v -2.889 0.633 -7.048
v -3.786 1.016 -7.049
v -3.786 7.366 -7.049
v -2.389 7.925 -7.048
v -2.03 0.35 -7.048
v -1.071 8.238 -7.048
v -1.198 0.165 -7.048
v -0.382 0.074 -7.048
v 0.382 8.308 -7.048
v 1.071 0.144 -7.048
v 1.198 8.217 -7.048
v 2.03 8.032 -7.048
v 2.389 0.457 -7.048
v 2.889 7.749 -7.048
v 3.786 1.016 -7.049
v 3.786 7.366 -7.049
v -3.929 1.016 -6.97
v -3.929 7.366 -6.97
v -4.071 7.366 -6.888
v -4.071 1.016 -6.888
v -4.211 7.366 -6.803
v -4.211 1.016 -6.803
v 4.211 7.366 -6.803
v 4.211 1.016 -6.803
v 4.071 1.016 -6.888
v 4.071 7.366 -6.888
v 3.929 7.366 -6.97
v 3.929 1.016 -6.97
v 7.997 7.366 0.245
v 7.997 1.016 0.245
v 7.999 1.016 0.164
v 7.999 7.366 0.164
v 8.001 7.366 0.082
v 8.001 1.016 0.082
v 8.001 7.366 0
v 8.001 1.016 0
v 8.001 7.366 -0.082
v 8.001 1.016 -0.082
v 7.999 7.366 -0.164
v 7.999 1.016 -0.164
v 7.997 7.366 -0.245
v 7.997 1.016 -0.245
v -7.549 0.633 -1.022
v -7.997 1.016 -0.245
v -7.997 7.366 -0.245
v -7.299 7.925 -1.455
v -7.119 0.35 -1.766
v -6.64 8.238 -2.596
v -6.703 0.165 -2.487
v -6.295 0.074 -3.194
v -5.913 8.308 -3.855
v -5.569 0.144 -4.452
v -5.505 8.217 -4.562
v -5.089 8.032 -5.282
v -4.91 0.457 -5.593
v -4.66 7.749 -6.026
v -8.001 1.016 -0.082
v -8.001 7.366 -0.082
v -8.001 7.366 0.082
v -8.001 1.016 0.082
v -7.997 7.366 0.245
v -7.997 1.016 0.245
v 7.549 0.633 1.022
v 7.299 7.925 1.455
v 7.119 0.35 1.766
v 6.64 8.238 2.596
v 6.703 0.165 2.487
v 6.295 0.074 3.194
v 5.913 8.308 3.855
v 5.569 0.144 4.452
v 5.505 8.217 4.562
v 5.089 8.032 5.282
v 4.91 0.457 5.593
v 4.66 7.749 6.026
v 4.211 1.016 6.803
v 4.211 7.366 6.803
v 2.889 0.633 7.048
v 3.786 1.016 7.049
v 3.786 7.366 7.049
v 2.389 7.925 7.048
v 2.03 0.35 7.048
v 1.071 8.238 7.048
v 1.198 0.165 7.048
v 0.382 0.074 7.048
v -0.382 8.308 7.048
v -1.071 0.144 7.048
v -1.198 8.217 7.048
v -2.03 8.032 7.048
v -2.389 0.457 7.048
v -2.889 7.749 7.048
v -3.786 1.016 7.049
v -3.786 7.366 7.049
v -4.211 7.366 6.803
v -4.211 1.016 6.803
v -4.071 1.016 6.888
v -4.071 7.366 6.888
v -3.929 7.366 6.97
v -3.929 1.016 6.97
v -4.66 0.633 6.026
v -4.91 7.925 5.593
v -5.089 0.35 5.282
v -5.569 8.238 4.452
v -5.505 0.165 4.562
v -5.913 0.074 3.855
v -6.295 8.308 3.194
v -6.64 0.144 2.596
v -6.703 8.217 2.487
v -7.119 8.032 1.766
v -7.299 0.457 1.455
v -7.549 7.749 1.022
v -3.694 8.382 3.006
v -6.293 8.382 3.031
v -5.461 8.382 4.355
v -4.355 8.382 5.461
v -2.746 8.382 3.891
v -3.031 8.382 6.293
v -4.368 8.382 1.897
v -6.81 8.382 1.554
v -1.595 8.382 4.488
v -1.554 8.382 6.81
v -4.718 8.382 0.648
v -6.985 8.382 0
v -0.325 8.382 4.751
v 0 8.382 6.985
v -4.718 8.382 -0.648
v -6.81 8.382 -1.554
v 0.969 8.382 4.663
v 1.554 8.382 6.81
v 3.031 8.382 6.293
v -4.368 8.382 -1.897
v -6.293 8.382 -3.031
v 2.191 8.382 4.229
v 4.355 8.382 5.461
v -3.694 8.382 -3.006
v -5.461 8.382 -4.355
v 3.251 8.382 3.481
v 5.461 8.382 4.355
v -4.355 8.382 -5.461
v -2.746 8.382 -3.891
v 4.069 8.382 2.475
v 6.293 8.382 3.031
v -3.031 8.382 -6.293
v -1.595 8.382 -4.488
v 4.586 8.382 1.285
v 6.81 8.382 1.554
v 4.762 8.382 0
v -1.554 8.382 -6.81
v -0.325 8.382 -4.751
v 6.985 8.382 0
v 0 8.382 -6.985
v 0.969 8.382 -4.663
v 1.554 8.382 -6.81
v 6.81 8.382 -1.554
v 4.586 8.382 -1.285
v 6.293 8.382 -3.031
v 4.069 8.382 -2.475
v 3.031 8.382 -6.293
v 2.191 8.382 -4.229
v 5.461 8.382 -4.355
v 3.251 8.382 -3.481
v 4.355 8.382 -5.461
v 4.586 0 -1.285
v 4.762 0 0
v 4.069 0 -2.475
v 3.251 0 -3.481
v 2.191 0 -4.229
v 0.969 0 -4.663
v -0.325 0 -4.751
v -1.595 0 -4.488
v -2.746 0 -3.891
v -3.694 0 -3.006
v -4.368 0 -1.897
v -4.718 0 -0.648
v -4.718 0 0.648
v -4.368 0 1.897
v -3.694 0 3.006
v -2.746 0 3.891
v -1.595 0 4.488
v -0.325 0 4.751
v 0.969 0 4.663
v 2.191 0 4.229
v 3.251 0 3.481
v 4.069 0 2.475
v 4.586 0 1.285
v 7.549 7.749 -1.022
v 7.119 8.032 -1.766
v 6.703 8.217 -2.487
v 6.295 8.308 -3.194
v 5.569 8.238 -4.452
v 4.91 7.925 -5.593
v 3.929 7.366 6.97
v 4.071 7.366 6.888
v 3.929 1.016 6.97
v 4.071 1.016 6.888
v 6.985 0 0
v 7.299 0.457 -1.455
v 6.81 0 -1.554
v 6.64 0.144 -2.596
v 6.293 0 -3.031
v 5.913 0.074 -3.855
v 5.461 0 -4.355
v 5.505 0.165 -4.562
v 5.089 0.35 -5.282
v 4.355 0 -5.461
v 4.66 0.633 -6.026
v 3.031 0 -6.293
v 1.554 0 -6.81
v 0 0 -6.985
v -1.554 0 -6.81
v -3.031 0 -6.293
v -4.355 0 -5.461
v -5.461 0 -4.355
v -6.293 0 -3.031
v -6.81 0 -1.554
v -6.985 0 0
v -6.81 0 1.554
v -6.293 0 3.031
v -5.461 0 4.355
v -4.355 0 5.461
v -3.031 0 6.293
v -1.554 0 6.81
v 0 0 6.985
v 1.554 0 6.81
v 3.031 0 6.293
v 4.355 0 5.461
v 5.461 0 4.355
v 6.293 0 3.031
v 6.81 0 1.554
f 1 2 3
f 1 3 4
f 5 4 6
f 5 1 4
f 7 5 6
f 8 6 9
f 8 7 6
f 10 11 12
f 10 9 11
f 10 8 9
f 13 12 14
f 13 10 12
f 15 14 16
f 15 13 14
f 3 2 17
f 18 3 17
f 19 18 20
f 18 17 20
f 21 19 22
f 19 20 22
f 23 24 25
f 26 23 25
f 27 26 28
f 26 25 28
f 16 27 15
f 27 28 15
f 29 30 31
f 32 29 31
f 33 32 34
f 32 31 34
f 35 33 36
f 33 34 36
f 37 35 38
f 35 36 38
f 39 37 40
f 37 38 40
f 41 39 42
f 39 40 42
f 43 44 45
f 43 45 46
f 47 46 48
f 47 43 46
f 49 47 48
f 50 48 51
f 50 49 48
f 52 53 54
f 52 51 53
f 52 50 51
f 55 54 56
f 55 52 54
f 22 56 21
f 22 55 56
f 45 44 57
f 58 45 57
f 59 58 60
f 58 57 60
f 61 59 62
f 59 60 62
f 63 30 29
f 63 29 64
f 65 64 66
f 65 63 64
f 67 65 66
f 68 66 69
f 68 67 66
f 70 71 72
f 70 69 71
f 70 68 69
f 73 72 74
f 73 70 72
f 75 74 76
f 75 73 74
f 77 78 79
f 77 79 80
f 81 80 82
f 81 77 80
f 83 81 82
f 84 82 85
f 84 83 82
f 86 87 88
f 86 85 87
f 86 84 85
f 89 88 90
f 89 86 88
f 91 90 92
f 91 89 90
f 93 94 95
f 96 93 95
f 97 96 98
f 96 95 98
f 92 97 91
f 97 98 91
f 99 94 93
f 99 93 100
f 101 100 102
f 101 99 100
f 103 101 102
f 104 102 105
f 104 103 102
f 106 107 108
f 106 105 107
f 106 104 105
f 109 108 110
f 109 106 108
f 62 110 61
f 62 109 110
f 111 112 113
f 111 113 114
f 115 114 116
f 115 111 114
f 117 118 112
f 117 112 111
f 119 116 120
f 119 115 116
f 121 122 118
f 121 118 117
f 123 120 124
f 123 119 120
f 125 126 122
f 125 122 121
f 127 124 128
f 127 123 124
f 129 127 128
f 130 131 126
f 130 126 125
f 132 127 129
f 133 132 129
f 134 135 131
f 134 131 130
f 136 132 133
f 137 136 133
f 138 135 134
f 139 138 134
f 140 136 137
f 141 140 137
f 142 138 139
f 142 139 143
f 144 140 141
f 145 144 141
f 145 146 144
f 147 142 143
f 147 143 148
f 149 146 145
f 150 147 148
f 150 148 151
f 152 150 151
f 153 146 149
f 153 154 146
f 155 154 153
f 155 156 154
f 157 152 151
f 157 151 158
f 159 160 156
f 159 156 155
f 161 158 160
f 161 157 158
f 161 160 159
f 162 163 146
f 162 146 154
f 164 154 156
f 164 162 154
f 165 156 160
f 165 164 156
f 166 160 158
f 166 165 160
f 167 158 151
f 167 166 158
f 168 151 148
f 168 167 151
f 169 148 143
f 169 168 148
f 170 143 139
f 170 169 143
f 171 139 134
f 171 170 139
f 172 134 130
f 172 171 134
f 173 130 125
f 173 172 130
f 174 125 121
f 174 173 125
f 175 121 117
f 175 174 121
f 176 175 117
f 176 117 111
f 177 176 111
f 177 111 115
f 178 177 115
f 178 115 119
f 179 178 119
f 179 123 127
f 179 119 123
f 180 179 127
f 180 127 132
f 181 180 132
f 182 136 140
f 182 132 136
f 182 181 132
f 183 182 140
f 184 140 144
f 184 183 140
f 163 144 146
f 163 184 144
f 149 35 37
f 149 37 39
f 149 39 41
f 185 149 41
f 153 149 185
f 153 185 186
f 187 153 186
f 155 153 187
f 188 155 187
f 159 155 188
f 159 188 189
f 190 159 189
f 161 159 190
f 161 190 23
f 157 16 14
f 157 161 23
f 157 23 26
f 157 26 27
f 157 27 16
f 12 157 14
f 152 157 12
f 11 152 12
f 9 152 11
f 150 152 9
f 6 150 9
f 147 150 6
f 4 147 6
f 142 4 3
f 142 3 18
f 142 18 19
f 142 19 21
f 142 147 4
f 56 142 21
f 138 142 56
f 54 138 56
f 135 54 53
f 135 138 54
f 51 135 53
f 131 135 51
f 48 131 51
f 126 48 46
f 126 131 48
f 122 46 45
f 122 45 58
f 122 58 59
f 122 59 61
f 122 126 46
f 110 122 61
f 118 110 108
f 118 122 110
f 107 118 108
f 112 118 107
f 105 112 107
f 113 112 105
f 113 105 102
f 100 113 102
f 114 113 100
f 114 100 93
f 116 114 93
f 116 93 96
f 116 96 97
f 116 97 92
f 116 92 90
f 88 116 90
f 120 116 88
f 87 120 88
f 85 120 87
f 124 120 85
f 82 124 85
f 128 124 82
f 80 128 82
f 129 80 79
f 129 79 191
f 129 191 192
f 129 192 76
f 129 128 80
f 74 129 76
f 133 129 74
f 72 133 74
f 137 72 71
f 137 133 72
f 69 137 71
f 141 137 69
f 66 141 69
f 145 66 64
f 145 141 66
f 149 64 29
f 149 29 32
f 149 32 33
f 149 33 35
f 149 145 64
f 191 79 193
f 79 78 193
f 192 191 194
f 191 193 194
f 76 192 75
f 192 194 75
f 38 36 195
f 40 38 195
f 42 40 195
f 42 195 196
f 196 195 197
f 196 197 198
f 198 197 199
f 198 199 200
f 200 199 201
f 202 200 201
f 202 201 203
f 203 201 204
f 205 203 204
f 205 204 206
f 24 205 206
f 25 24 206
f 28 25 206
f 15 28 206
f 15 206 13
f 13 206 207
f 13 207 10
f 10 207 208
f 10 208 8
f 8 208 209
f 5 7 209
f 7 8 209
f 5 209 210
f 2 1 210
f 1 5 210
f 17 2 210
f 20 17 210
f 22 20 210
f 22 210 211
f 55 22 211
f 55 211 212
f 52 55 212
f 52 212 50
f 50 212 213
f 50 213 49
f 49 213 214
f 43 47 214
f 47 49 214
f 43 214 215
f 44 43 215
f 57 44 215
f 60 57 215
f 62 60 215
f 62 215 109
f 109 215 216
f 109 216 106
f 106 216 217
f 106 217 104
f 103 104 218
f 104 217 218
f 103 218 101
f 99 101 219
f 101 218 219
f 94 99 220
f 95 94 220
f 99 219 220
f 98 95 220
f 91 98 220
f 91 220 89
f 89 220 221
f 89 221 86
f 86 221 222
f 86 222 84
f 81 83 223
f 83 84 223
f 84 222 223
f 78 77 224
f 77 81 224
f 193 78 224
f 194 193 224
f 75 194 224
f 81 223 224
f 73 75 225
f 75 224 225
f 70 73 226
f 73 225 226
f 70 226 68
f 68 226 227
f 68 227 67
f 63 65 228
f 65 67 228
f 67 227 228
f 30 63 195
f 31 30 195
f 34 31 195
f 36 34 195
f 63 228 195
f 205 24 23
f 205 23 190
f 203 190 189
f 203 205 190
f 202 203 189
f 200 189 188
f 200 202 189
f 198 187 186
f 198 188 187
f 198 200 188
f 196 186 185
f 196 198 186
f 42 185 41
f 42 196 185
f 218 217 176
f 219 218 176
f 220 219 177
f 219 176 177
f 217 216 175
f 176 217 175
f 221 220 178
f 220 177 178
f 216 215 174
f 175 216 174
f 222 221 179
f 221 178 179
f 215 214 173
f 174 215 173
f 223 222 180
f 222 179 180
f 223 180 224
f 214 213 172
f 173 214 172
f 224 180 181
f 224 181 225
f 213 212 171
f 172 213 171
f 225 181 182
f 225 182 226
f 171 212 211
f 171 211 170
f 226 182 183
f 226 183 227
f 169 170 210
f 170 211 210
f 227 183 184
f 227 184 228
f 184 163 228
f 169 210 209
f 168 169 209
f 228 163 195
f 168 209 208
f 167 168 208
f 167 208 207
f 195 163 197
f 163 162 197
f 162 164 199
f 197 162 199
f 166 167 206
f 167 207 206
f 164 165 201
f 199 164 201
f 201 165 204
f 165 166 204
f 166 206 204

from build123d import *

# Parameters (mm, degrees)
SKETCH2_R      = 8.001
EXTRUDE2_DEPTH = 8.382
CHAMFER1_SIZE  = 1.016
EXTRUDE3_REACH = 10.382
SKETCH1_R      = 4.7625


with BuildPart() as part:
    # Sketch2 → Extrude2 (new body)
    with BuildSketch(Plane(origin=(0, 0, 0), x_dir=(1, 0, 0), z_dir=(0, 1, 0))):
        Circle(SKETCH2_R)
    extrude(amount=EXTRUDE2_DEPTH)

    # Chamfer1
    chamfer1_edges = [part.edges().sort_by_distance(p)[0] for p in [
        (-8.001, 0, 0),
        (-8.001, 8.382, 0),
    ]]
    chamfer(chamfer1_edges, length=CHAMFER1_SIZE)

    # Sketch1 → Extrude3 (cut, up to next)
    with BuildSketch(Plane(origin=(0, 0, 0), x_dir=(1, 0, 0), z_dir=(0, 1, 0)), mode=Mode.PRIVATE) as extrude3_sk1:
        with BuildLine():
            ThreePointArc((-8.138906745, 0), (-7.0485, -4.069453372), (-4.069453372, -7.0485))
            Line((-4.069453372, -7.0485), (-8.138906745, 0))
        make_face()
    extrude3_tool1 = extrude(extrude3_sk1.sketch, amount=EXTRUDE3_REACH, mode=Mode.PRIVATE) & part.part
    add(extrude3_tool1.solids().sort_by_distance((-6.484164, 0, 3.743634))[0], mode=Mode.SUBTRACT)
    # Sketch1 → Extrude3 (cut, up to next)
    with BuildSketch(Plane(origin=(0, 0, 0), x_dir=(1, 0, 0), z_dir=(0, 1, 0)), mode=Mode.PRIVATE) as extrude3_sk2:
        with BuildLine():
            ThreePointArc((-4.069453372, 7.0485), (-7.0485, 4.069453372), (-8.138906745, 0))
            Line((-8.138906745, 0), (-4.069453372, 7.0485))
        make_face()
    extrude3_tool2 = extrude(extrude3_sk2.sketch, amount=EXTRUDE3_REACH, mode=Mode.PRIVATE) & part.part
    add(extrude3_tool2.solids().sort_by_distance((-6.484164, 0, -3.743634))[0], mode=Mode.SUBTRACT)
    # Sketch1 → Extrude3 (cut, up to next)
    with BuildSketch(Plane(origin=(0, 0, 0), x_dir=(1, 0, 0), z_dir=(0, 1, 0)), mode=Mode.PRIVATE) as extrude3_sk3:
        Circle(SKETCH1_R)
    extrude3_tool3 = extrude(extrude3_sk3.sketch, amount=EXTRUDE3_REACH, mode=Mode.PRIVATE) & part.part
    add(extrude3_tool3.solids().sort_by_distance((0, 0, 0))[0], mode=Mode.SUBTRACT)
    # Sketch1 → Extrude3 (cut, up to next)
    with BuildSketch(Plane(origin=(0, 0, 0), x_dir=(1, 0, 0), z_dir=(0, 1, 0)), mode=Mode.PRIVATE) as extrude3_sk4:
        with BuildLine():
            Line((-4.069453372, 7.0485), (4.069453372, 7.0485))
            ThreePointArc((4.069453372, 7.0485), (0, 8.138906745), (-4.069453372, 7.0485))
        make_face()
    extrude3_tool4 = extrude(extrude3_sk4.sketch, amount=EXTRUDE3_REACH, mode=Mode.PRIVATE) & part.part
    add(extrude3_tool4.solids().sort_by_distance((0, 0, -7.487268))[0], mode=Mode.SUBTRACT)
    # Sketch1 → Extrude3 (cut, up to next)
    with BuildSketch(Plane(origin=(0, 0, 0), x_dir=(1, 0, 0), z_dir=(0, 1, 0)), mode=Mode.PRIVATE) as extrude3_sk5:
        with BuildLine():
            Line((4.069453372, 7.0485), (8.138906745, 0))
            ThreePointArc((8.138906745, 0), (7.0485, 4.069453372), (4.069453372, 7.0485))
        make_face()
    extrude3_tool5 = extrude(extrude3_sk5.sketch, amount=EXTRUDE3_REACH, mode=Mode.PRIVATE) & part.part
    add(extrude3_tool5.solids().sort_by_distance((6.484164, 0, -3.743634))[0], mode=Mode.SUBTRACT)
    # Sketch1 → Extrude3 (cut, up to next)
    with BuildSketch(Plane(origin=(0, 0, 0), x_dir=(1, 0, 0), z_dir=(0, 1, 0)), mode=Mode.PRIVATE) as extrude3_sk6:
        with BuildLine():
            Line((8.138906745, 0), (4.069453372, -7.0485))
            ThreePointArc((4.069453372, -7.0485), (7.0485, -4.069453372), (8.138906745, 0))
        make_face()
    extrude3_tool6 = extrude(extrude3_sk6.sketch, amount=EXTRUDE3_REACH, mode=Mode.PRIVATE) & part.part
    add(extrude3_tool6.solids().sort_by_distance((6.484164, 0, 3.743634))[0], mode=Mode.SUBTRACT)
    # Sketch1 → Extrude3 (cut, up to next)
    with BuildSketch(Plane(origin=(0, 0, 0), x_dir=(1, 0, 0), z_dir=(0, 1, 0)), mode=Mode.PRIVATE) as extrude3_sk7:
        with BuildLine():
            ThreePointArc((-4.069453372, -7.0485), (0, -8.138906745), (4.069453372, -7.0485))
            Line((4.069453372, -7.0485), (-4.069453372, -7.0485))
        make_face()
    extrude3_tool7 = extrude(extrude3_sk7.sketch, amount=EXTRUDE3_REACH, mode=Mode.PRIVATE) & part.part
    add(extrude3_tool7.solids().sort_by_distance((0, 0, 7.487268))[0], mode=Mode.SUBTRACT)


solid = part.part
